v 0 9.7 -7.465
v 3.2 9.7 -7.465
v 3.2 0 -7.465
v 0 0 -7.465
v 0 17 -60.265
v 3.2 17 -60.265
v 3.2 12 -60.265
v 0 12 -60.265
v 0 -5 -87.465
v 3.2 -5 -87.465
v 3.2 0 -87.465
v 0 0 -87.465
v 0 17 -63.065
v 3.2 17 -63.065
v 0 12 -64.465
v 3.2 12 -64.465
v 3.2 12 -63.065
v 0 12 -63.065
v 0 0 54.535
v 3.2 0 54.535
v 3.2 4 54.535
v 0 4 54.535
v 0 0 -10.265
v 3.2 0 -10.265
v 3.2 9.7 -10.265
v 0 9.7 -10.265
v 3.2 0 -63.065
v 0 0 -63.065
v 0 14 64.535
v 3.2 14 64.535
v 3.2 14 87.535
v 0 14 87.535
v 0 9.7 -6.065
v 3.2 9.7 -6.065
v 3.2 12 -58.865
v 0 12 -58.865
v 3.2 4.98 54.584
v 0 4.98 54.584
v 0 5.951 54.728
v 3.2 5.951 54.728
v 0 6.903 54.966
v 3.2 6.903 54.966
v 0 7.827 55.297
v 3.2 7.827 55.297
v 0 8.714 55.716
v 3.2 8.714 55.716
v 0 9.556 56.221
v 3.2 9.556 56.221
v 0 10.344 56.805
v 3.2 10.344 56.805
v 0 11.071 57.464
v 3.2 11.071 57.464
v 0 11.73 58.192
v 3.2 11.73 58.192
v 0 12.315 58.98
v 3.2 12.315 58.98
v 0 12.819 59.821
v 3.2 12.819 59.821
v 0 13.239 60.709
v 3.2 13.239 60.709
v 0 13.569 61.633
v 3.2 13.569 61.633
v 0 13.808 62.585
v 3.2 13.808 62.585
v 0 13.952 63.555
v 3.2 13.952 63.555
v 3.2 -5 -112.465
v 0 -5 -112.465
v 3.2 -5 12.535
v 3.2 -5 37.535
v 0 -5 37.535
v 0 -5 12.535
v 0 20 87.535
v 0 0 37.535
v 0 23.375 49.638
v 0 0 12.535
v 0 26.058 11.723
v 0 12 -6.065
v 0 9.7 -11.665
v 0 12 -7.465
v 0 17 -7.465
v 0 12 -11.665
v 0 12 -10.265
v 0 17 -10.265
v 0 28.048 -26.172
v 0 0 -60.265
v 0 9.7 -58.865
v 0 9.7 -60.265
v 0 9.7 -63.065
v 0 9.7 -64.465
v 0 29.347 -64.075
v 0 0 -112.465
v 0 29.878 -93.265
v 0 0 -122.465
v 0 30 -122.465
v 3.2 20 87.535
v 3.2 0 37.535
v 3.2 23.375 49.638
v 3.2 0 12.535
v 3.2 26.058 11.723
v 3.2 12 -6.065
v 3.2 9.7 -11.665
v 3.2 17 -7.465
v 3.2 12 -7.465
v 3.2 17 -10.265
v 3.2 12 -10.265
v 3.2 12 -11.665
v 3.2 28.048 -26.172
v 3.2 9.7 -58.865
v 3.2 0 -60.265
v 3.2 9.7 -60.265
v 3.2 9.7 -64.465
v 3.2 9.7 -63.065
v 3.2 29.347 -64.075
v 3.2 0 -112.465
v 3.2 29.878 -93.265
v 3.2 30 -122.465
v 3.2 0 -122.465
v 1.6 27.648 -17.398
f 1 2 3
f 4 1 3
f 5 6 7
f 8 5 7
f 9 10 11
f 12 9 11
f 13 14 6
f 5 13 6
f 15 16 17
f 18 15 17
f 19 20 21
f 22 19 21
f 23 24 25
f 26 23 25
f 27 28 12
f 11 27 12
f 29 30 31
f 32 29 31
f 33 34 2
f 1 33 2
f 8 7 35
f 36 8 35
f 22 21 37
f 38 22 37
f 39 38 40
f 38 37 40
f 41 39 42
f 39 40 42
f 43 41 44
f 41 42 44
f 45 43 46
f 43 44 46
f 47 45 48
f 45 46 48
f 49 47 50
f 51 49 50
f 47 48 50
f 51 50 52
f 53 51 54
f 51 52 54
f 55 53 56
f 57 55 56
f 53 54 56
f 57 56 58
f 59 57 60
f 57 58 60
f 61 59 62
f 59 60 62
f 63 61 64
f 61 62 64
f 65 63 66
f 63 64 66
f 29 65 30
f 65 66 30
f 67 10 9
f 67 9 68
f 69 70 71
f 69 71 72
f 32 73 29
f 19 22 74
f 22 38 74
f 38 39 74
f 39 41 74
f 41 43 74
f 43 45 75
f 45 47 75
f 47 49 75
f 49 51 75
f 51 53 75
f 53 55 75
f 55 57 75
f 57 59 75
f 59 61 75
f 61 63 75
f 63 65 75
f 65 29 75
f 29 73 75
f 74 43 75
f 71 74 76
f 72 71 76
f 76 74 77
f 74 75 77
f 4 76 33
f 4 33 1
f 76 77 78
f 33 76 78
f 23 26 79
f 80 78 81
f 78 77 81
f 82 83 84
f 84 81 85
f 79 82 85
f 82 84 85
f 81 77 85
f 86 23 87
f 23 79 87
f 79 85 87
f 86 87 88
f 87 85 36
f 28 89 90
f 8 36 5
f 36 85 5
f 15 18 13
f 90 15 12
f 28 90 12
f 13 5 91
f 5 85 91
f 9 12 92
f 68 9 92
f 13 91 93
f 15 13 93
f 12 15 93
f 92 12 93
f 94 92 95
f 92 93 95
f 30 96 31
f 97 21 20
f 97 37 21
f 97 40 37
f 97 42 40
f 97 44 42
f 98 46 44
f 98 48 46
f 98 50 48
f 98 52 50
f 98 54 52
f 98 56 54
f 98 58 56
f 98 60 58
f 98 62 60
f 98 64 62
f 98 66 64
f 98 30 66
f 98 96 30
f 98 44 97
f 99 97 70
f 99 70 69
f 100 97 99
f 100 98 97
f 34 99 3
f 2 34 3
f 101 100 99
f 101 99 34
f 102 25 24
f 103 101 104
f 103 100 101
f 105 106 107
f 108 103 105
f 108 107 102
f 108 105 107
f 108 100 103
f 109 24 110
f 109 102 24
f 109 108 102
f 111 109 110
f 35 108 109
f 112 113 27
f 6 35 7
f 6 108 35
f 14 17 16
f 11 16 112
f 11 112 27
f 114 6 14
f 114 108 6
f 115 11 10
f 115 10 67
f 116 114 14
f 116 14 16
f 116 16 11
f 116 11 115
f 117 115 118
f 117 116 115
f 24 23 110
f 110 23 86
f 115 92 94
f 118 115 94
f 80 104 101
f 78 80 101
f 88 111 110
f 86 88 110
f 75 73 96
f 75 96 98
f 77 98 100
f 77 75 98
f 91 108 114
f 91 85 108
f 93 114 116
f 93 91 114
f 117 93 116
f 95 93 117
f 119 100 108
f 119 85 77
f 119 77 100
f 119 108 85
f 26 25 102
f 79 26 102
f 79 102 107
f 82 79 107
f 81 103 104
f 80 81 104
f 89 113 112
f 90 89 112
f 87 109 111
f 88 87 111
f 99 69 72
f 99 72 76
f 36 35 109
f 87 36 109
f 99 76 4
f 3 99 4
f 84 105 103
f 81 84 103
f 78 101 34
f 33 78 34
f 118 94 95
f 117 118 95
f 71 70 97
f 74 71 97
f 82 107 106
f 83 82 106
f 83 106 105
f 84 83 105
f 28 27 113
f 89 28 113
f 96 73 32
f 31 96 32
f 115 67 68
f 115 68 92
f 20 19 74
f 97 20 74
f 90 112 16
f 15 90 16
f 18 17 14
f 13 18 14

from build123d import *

# Parameters (mm, degrees)
MAIN_DEPTH        = 3.2
WHEEL_DEPTH       = 3.2
SKETCH3_W         = 25
SKETCH3_H         = 5
TABS_DEPTH        = 3.2
SCREW_HOLES_DEPTH = 3.2


with BuildPart() as part:
    # Sketch1 → main (new body)
    with BuildSketch(Plane(origin=(0, 0, 0), x_dir=(0, 0, -1), z_dir=(1, 0, 0))):
        with BuildLine():
            Line((-87.535437106, 0), (122.464562894, 0))
            Line((122.464562894, 0), (122.464562894, 30))
            add(Edge.make_bspline(
                [(-87.535437106, 20), (17.331032425, 30.296907598), (122.464562894, 30)],
                knots=[0, 0, 0, 1, 1, 1], degree=2))
            Line((-87.535437106, 20), (-87.535437106, 0))
        make_face()
    extrude(amount=MAIN_DEPTH)

    # Sketch2 → wheel (cut)
    with BuildSketch(Plane(origin=(3.2, 0, 0), x_dir=(0, 0, -1), z_dir=(1, 0, 0))):
        with BuildLine():
            Line((-87.535437106, 0), (-54.535437106, 0))
            Line((-54.535437106, 0), (-54.535437106, 4))
            ThreePointArc((-54.535437106, 4), (-57.464369294, 11.071067812), (-64.535437106, 14))
            Line((-64.535437106, 14), (-87.535437106, 14))
            Line((-87.535437106, 14), (-87.535437106, 0))
        make_face()
    extrude(amount=-WHEEL_DEPTH, mode=Mode.SUBTRACT)

    # Sketch3 → tabs (add)
    with BuildSketch(Plane(origin=(3.2, 0, 0), x_dir=(0, 0, -1), z_dir=(1, 0, 0))):
        with Locations((-25.035437106, -2.5)):
            Rectangle(SKETCH3_W, SKETCH3_H)
        with Locations((99.964562894, -2.5)):
            Rectangle(SKETCH3_W, SKETCH3_H)
    extrude(amount=-TABS_DEPTH)

    # Sketch5 → screw holes (cut)
    with BuildSketch(Plane(origin=(3.2, 0, 0), x_dir=(0, 0, -1), z_dir=(1, 0, 0))):
        Polygon((7.464562894, 0), (10.264562894, 0), (10.264562894, 9.7), (11.664562894, 9.7), (11.664562894, 12), (10.264562894, 12), (10.264562894, 17), (7.464562894, 17), (7.464562894, 12), (6.064562894, 12), (6.064562894, 9.7), (7.464562894, 9.7), align=None)
        Polygon((60.264562894, 0), (63.064562894, 0), (63.064562894, 9.7), (64.464562894, 9.7), (64.464562894, 12), (63.064562894, 12), (63.064562894, 17), (60.264562894, 17), (60.264562894, 12), (58.864562894, 12), (58.864562894, 9.7), (60.264562894, 9.7), align=None)
    extrude(amount=-SCREW_HOLES_DEPTH, mode=Mode.SUBTRACT)


solid = part.part
